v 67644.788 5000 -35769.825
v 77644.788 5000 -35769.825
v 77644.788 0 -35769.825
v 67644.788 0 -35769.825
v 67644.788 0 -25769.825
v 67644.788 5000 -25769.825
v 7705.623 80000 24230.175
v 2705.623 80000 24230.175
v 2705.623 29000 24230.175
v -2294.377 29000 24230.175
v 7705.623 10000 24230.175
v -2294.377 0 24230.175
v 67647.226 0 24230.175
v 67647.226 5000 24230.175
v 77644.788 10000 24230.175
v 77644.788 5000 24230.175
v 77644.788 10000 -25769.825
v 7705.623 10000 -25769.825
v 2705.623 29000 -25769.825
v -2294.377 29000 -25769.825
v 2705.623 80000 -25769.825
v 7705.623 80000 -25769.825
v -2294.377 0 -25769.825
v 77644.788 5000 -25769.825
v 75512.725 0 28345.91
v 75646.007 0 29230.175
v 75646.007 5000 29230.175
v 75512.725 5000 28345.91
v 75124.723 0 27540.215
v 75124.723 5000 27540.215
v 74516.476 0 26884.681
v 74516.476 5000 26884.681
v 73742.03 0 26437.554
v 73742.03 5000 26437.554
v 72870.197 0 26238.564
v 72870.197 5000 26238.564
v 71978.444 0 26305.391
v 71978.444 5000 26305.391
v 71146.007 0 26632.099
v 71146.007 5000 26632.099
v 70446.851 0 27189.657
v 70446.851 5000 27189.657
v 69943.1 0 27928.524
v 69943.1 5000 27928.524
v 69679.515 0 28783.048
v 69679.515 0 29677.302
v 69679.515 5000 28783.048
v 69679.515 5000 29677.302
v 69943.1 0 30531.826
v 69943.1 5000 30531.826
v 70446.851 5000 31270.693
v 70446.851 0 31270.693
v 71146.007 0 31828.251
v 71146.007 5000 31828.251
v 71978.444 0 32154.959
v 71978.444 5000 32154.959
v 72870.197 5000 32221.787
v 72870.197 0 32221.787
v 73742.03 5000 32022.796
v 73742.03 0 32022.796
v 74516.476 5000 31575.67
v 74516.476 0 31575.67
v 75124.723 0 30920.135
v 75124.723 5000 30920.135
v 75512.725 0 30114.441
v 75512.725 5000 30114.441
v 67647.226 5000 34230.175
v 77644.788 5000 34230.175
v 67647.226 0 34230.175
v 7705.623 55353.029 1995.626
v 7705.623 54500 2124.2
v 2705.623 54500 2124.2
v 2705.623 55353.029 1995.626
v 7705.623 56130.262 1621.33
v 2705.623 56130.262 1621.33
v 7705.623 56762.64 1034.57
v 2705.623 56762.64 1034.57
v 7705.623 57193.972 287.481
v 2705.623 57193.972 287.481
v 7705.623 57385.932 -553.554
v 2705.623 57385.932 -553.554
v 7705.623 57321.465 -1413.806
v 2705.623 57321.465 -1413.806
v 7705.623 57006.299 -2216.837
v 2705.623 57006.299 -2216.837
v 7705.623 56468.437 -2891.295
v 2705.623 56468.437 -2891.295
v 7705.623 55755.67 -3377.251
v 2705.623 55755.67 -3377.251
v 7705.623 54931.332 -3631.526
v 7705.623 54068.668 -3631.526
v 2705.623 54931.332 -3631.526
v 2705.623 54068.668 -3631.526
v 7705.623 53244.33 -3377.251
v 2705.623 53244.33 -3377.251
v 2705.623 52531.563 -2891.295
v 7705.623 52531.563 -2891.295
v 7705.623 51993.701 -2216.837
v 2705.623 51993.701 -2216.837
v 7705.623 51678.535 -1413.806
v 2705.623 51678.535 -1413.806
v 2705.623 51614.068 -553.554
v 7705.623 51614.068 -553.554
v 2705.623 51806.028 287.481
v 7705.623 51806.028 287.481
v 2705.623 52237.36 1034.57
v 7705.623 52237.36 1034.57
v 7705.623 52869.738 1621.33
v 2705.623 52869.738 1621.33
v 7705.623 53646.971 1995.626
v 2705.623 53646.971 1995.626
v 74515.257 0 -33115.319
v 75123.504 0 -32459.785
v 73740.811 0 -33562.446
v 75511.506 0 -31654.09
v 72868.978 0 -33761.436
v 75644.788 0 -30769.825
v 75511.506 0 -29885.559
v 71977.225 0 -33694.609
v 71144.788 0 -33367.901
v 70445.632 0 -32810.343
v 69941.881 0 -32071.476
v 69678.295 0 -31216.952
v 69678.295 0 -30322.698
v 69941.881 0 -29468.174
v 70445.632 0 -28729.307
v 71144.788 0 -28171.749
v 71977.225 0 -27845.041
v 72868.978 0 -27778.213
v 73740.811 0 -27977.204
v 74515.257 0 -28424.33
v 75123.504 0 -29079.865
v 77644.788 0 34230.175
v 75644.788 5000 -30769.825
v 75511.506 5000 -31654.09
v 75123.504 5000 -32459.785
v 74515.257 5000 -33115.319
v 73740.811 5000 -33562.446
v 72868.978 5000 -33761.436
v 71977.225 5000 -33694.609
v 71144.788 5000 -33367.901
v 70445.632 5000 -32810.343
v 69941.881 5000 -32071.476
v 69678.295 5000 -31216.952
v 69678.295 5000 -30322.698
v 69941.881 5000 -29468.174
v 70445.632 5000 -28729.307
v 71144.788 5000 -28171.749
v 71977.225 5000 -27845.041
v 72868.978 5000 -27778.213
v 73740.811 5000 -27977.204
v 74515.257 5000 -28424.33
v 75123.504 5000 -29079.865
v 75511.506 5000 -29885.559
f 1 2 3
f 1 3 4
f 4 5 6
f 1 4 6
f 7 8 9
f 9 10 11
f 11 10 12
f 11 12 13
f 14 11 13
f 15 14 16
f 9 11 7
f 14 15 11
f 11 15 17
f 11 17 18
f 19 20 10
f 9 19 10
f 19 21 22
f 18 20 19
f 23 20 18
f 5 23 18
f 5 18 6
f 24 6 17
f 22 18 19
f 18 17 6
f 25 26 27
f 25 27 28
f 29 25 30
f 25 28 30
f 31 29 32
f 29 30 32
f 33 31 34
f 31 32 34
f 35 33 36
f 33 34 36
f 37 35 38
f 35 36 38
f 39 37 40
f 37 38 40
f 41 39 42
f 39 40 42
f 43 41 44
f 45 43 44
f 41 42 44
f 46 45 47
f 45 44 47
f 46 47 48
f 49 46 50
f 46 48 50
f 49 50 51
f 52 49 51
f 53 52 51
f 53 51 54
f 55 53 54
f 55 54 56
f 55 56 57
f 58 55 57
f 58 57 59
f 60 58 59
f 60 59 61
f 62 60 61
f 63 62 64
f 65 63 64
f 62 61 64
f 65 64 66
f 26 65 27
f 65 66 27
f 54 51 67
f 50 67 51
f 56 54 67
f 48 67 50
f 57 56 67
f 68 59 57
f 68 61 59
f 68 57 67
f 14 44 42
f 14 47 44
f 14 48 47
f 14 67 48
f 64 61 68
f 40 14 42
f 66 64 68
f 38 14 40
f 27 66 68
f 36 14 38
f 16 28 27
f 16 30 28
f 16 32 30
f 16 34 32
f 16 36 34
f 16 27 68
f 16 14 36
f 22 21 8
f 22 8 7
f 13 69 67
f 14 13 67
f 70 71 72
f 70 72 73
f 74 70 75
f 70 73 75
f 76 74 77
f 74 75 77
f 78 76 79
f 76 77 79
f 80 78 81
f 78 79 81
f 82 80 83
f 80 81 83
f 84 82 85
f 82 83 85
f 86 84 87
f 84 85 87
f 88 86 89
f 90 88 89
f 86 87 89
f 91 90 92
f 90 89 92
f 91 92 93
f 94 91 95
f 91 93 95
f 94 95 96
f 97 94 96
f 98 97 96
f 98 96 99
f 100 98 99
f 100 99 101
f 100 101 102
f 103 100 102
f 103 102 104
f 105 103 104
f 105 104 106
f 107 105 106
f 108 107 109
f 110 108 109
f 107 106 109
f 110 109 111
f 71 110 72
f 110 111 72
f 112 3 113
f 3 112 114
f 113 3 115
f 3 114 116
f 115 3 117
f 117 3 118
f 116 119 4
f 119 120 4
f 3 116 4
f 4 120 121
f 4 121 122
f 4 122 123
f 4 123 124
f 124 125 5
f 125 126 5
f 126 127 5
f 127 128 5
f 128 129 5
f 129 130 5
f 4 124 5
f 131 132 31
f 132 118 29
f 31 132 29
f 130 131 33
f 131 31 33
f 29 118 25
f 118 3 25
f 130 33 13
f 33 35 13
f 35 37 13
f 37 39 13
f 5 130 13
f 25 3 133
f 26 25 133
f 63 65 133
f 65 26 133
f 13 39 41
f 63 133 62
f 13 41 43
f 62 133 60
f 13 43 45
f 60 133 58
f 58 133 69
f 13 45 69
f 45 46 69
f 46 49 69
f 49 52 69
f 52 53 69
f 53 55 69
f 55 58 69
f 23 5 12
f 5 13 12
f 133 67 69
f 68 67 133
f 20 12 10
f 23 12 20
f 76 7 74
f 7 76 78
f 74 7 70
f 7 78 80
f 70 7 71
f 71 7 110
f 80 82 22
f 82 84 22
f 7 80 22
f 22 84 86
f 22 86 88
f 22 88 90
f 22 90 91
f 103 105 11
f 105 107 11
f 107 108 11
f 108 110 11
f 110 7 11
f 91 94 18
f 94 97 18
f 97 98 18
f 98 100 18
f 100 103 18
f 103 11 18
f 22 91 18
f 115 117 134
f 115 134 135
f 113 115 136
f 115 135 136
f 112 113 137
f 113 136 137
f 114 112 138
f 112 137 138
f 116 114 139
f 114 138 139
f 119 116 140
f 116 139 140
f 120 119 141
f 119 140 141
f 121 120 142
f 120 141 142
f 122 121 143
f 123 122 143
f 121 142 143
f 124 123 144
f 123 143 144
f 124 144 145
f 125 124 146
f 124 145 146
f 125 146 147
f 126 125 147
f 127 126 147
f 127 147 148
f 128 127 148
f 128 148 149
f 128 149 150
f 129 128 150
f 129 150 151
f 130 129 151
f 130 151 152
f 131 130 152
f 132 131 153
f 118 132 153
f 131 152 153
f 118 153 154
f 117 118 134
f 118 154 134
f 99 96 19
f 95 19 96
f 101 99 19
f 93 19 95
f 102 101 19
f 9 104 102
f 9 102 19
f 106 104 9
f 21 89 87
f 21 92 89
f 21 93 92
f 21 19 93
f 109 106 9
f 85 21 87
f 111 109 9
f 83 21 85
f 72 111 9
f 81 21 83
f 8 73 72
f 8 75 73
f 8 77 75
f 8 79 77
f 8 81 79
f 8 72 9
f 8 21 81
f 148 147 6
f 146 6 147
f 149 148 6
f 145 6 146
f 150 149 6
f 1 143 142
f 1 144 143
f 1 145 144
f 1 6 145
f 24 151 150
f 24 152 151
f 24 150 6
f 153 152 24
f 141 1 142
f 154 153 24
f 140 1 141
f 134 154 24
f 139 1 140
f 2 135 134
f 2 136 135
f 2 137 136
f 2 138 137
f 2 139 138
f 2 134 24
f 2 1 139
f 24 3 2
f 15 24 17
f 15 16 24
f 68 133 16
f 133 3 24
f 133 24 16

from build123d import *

# Parameters (mm, degrees)
SKETCH1_W           = 79939.164357761
SKETCH1_H           = 50000
BOSS_EXTRUDE2_DEPTH = 10000
SKETCH5_W           = 9997.561237483
SKETCH5_H           = 10000
BOSS_EXTRUDE3_DEPTH = 10000
SKETCH6_W           = 9997.561237483
SKETCH6_H           = 10000
CUT_EXTRUDE1_DEPTH  = 5000
SKETCH9_W           = 10000
SKETCH9_H           = 10000
BOSS_EXTRUDE5_DEPTH = 10000
SKETCH11_W          = 10000
SKETCH11_H          = 10000
CUT_EXTRUDE3_DEPTH  = 5000
SKETCH13_R          = 3000
CUT_EXTRUDE5_DEPTH  = 5000
SKETCH14_R          = 3000
CUT_EXTRUDE6_DEPTH  = 5000
SKETCH15_W          = 10000
SKETCH15_H          = 50000
BOSS_EXTRUDE6_DEPTH = 70000
SKETCH16_W          = 50000
SKETCH16_H          = 51000
CUT_EXTRUDE7_DEPTH  = 5000
SKETCH17_R          = 2894.024625878
CUT_EXTRUDE8_DEPTH  = 5000


with BuildPart() as part:
    # Sketch1 → Boss-Extrude2 (new body)
    with BuildSketch(Plane(origin=(0, 0, 0), x_dir=(1, 0, 0), z_dir=(0, 1, 0))):
        with Locations((37675.205465908, 769.824887906)):
            Rectangle(SKETCH1_W, SKETCH1_H)
    extrude(amount=BOSS_EXTRUDE2_DEPTH)

    # Sketch5 → Boss-Extrude3 (add)
    with BuildSketch(Plane.XY.offset(24230.175112094)):
        with Locations((72646.007026047, 5000)):
            Rectangle(SKETCH5_W, SKETCH5_H)
    extrude(amount=BOSS_EXTRUDE3_DEPTH)

    # Sketch6 → Cut-Extrude1 (cut)
    with BuildSketch(Plane(origin=(0, 10000, 0), x_dir=(1, 0, 0), z_dir=(0, 1, 0))):
        with Locations((72646.007026047, -29230.175112094)):
            Rectangle(SKETCH6_W, SKETCH6_H)
    extrude(amount=-CUT_EXTRUDE1_DEPTH, mode=Mode.SUBTRACT)

    # Sketch9 → Boss-Extrude5 (add)
    with BuildSketch(Plane(origin=(0, 0, -25769.824887906), x_dir=(-1, 0, 0), z_dir=(0, 0, -1))):
        with Locations((-72644.787644788, 5000)):
            Rectangle(SKETCH9_W, SKETCH9_H)
    extrude(amount=BOSS_EXTRUDE5_DEPTH)

    # Sketch11 → Cut-Extrude3 (cut)
    with BuildSketch(Plane(origin=(0, 10000, 0), x_dir=(1, 0, 0), z_dir=(0, 1, 0))):
        with Locations((72644.787644788, 30769.824887906)):
            Rectangle(SKETCH11_W, SKETCH11_H)
    extrude(amount=-CUT_EXTRUDE3_DEPTH, mode=Mode.SUBTRACT)

    # Sketch13 → Cut-Extrude5 (cut)
    with BuildSketch(Plane(origin=(0, 5000, 0), x_dir=(1, 0, 0), z_dir=(0, 1, 0))):
        with Locations((72646.007026046, -29230.175112094)):
            Circle(SKETCH13_R)
    extrude(amount=-CUT_EXTRUDE5_DEPTH, mode=Mode.SUBTRACT)

    # Sketch14 → Cut-Extrude6 (cut)
    with BuildSketch(Plane(origin=(0, 5000, 0), x_dir=(1, 0, 0), z_dir=(0, 1, 0))):
        with Locations((72644.787644788, 30769.824887906)):
            Circle(SKETCH14_R)
    extrude(amount=-CUT_EXTRUDE6_DEPTH, mode=Mode.SUBTRACT)

    # Sketch15 → Boss-Extrude6 (add)
    with BuildSketch(Plane(origin=(0, 10000, 0), x_dir=(1, 0, 0), z_dir=(0, 1, 0))):
        with Locations((2705.623287027, 769.824887906)):
            Rectangle(SKETCH15_W, SKETCH15_H)
    extrude(amount=BOSS_EXTRUDE6_DEPTH)

    # Sketch16 → Cut-Extrude7 (cut)
    with BuildSketch(Plane.ZY.offset(2294.376712973)):
        with Locations((-769.824887906, 54500)):
            Rectangle(SKETCH16_W, SKETCH16_H)
    extrude(amount=-CUT_EXTRUDE7_DEPTH, mode=Mode.SUBTRACT)

    # Sketch17 → Cut-Extrude8 (cut)
    with BuildSketch(Plane.ZY.offset(-2705.623287027)):
        with Locations((-769.824887906, 54500)):
            Circle(SKETCH17_R)
    extrude(amount=-CUT_EXTRUDE8_DEPTH, mode=Mode.SUBTRACT)


solid = part.part
